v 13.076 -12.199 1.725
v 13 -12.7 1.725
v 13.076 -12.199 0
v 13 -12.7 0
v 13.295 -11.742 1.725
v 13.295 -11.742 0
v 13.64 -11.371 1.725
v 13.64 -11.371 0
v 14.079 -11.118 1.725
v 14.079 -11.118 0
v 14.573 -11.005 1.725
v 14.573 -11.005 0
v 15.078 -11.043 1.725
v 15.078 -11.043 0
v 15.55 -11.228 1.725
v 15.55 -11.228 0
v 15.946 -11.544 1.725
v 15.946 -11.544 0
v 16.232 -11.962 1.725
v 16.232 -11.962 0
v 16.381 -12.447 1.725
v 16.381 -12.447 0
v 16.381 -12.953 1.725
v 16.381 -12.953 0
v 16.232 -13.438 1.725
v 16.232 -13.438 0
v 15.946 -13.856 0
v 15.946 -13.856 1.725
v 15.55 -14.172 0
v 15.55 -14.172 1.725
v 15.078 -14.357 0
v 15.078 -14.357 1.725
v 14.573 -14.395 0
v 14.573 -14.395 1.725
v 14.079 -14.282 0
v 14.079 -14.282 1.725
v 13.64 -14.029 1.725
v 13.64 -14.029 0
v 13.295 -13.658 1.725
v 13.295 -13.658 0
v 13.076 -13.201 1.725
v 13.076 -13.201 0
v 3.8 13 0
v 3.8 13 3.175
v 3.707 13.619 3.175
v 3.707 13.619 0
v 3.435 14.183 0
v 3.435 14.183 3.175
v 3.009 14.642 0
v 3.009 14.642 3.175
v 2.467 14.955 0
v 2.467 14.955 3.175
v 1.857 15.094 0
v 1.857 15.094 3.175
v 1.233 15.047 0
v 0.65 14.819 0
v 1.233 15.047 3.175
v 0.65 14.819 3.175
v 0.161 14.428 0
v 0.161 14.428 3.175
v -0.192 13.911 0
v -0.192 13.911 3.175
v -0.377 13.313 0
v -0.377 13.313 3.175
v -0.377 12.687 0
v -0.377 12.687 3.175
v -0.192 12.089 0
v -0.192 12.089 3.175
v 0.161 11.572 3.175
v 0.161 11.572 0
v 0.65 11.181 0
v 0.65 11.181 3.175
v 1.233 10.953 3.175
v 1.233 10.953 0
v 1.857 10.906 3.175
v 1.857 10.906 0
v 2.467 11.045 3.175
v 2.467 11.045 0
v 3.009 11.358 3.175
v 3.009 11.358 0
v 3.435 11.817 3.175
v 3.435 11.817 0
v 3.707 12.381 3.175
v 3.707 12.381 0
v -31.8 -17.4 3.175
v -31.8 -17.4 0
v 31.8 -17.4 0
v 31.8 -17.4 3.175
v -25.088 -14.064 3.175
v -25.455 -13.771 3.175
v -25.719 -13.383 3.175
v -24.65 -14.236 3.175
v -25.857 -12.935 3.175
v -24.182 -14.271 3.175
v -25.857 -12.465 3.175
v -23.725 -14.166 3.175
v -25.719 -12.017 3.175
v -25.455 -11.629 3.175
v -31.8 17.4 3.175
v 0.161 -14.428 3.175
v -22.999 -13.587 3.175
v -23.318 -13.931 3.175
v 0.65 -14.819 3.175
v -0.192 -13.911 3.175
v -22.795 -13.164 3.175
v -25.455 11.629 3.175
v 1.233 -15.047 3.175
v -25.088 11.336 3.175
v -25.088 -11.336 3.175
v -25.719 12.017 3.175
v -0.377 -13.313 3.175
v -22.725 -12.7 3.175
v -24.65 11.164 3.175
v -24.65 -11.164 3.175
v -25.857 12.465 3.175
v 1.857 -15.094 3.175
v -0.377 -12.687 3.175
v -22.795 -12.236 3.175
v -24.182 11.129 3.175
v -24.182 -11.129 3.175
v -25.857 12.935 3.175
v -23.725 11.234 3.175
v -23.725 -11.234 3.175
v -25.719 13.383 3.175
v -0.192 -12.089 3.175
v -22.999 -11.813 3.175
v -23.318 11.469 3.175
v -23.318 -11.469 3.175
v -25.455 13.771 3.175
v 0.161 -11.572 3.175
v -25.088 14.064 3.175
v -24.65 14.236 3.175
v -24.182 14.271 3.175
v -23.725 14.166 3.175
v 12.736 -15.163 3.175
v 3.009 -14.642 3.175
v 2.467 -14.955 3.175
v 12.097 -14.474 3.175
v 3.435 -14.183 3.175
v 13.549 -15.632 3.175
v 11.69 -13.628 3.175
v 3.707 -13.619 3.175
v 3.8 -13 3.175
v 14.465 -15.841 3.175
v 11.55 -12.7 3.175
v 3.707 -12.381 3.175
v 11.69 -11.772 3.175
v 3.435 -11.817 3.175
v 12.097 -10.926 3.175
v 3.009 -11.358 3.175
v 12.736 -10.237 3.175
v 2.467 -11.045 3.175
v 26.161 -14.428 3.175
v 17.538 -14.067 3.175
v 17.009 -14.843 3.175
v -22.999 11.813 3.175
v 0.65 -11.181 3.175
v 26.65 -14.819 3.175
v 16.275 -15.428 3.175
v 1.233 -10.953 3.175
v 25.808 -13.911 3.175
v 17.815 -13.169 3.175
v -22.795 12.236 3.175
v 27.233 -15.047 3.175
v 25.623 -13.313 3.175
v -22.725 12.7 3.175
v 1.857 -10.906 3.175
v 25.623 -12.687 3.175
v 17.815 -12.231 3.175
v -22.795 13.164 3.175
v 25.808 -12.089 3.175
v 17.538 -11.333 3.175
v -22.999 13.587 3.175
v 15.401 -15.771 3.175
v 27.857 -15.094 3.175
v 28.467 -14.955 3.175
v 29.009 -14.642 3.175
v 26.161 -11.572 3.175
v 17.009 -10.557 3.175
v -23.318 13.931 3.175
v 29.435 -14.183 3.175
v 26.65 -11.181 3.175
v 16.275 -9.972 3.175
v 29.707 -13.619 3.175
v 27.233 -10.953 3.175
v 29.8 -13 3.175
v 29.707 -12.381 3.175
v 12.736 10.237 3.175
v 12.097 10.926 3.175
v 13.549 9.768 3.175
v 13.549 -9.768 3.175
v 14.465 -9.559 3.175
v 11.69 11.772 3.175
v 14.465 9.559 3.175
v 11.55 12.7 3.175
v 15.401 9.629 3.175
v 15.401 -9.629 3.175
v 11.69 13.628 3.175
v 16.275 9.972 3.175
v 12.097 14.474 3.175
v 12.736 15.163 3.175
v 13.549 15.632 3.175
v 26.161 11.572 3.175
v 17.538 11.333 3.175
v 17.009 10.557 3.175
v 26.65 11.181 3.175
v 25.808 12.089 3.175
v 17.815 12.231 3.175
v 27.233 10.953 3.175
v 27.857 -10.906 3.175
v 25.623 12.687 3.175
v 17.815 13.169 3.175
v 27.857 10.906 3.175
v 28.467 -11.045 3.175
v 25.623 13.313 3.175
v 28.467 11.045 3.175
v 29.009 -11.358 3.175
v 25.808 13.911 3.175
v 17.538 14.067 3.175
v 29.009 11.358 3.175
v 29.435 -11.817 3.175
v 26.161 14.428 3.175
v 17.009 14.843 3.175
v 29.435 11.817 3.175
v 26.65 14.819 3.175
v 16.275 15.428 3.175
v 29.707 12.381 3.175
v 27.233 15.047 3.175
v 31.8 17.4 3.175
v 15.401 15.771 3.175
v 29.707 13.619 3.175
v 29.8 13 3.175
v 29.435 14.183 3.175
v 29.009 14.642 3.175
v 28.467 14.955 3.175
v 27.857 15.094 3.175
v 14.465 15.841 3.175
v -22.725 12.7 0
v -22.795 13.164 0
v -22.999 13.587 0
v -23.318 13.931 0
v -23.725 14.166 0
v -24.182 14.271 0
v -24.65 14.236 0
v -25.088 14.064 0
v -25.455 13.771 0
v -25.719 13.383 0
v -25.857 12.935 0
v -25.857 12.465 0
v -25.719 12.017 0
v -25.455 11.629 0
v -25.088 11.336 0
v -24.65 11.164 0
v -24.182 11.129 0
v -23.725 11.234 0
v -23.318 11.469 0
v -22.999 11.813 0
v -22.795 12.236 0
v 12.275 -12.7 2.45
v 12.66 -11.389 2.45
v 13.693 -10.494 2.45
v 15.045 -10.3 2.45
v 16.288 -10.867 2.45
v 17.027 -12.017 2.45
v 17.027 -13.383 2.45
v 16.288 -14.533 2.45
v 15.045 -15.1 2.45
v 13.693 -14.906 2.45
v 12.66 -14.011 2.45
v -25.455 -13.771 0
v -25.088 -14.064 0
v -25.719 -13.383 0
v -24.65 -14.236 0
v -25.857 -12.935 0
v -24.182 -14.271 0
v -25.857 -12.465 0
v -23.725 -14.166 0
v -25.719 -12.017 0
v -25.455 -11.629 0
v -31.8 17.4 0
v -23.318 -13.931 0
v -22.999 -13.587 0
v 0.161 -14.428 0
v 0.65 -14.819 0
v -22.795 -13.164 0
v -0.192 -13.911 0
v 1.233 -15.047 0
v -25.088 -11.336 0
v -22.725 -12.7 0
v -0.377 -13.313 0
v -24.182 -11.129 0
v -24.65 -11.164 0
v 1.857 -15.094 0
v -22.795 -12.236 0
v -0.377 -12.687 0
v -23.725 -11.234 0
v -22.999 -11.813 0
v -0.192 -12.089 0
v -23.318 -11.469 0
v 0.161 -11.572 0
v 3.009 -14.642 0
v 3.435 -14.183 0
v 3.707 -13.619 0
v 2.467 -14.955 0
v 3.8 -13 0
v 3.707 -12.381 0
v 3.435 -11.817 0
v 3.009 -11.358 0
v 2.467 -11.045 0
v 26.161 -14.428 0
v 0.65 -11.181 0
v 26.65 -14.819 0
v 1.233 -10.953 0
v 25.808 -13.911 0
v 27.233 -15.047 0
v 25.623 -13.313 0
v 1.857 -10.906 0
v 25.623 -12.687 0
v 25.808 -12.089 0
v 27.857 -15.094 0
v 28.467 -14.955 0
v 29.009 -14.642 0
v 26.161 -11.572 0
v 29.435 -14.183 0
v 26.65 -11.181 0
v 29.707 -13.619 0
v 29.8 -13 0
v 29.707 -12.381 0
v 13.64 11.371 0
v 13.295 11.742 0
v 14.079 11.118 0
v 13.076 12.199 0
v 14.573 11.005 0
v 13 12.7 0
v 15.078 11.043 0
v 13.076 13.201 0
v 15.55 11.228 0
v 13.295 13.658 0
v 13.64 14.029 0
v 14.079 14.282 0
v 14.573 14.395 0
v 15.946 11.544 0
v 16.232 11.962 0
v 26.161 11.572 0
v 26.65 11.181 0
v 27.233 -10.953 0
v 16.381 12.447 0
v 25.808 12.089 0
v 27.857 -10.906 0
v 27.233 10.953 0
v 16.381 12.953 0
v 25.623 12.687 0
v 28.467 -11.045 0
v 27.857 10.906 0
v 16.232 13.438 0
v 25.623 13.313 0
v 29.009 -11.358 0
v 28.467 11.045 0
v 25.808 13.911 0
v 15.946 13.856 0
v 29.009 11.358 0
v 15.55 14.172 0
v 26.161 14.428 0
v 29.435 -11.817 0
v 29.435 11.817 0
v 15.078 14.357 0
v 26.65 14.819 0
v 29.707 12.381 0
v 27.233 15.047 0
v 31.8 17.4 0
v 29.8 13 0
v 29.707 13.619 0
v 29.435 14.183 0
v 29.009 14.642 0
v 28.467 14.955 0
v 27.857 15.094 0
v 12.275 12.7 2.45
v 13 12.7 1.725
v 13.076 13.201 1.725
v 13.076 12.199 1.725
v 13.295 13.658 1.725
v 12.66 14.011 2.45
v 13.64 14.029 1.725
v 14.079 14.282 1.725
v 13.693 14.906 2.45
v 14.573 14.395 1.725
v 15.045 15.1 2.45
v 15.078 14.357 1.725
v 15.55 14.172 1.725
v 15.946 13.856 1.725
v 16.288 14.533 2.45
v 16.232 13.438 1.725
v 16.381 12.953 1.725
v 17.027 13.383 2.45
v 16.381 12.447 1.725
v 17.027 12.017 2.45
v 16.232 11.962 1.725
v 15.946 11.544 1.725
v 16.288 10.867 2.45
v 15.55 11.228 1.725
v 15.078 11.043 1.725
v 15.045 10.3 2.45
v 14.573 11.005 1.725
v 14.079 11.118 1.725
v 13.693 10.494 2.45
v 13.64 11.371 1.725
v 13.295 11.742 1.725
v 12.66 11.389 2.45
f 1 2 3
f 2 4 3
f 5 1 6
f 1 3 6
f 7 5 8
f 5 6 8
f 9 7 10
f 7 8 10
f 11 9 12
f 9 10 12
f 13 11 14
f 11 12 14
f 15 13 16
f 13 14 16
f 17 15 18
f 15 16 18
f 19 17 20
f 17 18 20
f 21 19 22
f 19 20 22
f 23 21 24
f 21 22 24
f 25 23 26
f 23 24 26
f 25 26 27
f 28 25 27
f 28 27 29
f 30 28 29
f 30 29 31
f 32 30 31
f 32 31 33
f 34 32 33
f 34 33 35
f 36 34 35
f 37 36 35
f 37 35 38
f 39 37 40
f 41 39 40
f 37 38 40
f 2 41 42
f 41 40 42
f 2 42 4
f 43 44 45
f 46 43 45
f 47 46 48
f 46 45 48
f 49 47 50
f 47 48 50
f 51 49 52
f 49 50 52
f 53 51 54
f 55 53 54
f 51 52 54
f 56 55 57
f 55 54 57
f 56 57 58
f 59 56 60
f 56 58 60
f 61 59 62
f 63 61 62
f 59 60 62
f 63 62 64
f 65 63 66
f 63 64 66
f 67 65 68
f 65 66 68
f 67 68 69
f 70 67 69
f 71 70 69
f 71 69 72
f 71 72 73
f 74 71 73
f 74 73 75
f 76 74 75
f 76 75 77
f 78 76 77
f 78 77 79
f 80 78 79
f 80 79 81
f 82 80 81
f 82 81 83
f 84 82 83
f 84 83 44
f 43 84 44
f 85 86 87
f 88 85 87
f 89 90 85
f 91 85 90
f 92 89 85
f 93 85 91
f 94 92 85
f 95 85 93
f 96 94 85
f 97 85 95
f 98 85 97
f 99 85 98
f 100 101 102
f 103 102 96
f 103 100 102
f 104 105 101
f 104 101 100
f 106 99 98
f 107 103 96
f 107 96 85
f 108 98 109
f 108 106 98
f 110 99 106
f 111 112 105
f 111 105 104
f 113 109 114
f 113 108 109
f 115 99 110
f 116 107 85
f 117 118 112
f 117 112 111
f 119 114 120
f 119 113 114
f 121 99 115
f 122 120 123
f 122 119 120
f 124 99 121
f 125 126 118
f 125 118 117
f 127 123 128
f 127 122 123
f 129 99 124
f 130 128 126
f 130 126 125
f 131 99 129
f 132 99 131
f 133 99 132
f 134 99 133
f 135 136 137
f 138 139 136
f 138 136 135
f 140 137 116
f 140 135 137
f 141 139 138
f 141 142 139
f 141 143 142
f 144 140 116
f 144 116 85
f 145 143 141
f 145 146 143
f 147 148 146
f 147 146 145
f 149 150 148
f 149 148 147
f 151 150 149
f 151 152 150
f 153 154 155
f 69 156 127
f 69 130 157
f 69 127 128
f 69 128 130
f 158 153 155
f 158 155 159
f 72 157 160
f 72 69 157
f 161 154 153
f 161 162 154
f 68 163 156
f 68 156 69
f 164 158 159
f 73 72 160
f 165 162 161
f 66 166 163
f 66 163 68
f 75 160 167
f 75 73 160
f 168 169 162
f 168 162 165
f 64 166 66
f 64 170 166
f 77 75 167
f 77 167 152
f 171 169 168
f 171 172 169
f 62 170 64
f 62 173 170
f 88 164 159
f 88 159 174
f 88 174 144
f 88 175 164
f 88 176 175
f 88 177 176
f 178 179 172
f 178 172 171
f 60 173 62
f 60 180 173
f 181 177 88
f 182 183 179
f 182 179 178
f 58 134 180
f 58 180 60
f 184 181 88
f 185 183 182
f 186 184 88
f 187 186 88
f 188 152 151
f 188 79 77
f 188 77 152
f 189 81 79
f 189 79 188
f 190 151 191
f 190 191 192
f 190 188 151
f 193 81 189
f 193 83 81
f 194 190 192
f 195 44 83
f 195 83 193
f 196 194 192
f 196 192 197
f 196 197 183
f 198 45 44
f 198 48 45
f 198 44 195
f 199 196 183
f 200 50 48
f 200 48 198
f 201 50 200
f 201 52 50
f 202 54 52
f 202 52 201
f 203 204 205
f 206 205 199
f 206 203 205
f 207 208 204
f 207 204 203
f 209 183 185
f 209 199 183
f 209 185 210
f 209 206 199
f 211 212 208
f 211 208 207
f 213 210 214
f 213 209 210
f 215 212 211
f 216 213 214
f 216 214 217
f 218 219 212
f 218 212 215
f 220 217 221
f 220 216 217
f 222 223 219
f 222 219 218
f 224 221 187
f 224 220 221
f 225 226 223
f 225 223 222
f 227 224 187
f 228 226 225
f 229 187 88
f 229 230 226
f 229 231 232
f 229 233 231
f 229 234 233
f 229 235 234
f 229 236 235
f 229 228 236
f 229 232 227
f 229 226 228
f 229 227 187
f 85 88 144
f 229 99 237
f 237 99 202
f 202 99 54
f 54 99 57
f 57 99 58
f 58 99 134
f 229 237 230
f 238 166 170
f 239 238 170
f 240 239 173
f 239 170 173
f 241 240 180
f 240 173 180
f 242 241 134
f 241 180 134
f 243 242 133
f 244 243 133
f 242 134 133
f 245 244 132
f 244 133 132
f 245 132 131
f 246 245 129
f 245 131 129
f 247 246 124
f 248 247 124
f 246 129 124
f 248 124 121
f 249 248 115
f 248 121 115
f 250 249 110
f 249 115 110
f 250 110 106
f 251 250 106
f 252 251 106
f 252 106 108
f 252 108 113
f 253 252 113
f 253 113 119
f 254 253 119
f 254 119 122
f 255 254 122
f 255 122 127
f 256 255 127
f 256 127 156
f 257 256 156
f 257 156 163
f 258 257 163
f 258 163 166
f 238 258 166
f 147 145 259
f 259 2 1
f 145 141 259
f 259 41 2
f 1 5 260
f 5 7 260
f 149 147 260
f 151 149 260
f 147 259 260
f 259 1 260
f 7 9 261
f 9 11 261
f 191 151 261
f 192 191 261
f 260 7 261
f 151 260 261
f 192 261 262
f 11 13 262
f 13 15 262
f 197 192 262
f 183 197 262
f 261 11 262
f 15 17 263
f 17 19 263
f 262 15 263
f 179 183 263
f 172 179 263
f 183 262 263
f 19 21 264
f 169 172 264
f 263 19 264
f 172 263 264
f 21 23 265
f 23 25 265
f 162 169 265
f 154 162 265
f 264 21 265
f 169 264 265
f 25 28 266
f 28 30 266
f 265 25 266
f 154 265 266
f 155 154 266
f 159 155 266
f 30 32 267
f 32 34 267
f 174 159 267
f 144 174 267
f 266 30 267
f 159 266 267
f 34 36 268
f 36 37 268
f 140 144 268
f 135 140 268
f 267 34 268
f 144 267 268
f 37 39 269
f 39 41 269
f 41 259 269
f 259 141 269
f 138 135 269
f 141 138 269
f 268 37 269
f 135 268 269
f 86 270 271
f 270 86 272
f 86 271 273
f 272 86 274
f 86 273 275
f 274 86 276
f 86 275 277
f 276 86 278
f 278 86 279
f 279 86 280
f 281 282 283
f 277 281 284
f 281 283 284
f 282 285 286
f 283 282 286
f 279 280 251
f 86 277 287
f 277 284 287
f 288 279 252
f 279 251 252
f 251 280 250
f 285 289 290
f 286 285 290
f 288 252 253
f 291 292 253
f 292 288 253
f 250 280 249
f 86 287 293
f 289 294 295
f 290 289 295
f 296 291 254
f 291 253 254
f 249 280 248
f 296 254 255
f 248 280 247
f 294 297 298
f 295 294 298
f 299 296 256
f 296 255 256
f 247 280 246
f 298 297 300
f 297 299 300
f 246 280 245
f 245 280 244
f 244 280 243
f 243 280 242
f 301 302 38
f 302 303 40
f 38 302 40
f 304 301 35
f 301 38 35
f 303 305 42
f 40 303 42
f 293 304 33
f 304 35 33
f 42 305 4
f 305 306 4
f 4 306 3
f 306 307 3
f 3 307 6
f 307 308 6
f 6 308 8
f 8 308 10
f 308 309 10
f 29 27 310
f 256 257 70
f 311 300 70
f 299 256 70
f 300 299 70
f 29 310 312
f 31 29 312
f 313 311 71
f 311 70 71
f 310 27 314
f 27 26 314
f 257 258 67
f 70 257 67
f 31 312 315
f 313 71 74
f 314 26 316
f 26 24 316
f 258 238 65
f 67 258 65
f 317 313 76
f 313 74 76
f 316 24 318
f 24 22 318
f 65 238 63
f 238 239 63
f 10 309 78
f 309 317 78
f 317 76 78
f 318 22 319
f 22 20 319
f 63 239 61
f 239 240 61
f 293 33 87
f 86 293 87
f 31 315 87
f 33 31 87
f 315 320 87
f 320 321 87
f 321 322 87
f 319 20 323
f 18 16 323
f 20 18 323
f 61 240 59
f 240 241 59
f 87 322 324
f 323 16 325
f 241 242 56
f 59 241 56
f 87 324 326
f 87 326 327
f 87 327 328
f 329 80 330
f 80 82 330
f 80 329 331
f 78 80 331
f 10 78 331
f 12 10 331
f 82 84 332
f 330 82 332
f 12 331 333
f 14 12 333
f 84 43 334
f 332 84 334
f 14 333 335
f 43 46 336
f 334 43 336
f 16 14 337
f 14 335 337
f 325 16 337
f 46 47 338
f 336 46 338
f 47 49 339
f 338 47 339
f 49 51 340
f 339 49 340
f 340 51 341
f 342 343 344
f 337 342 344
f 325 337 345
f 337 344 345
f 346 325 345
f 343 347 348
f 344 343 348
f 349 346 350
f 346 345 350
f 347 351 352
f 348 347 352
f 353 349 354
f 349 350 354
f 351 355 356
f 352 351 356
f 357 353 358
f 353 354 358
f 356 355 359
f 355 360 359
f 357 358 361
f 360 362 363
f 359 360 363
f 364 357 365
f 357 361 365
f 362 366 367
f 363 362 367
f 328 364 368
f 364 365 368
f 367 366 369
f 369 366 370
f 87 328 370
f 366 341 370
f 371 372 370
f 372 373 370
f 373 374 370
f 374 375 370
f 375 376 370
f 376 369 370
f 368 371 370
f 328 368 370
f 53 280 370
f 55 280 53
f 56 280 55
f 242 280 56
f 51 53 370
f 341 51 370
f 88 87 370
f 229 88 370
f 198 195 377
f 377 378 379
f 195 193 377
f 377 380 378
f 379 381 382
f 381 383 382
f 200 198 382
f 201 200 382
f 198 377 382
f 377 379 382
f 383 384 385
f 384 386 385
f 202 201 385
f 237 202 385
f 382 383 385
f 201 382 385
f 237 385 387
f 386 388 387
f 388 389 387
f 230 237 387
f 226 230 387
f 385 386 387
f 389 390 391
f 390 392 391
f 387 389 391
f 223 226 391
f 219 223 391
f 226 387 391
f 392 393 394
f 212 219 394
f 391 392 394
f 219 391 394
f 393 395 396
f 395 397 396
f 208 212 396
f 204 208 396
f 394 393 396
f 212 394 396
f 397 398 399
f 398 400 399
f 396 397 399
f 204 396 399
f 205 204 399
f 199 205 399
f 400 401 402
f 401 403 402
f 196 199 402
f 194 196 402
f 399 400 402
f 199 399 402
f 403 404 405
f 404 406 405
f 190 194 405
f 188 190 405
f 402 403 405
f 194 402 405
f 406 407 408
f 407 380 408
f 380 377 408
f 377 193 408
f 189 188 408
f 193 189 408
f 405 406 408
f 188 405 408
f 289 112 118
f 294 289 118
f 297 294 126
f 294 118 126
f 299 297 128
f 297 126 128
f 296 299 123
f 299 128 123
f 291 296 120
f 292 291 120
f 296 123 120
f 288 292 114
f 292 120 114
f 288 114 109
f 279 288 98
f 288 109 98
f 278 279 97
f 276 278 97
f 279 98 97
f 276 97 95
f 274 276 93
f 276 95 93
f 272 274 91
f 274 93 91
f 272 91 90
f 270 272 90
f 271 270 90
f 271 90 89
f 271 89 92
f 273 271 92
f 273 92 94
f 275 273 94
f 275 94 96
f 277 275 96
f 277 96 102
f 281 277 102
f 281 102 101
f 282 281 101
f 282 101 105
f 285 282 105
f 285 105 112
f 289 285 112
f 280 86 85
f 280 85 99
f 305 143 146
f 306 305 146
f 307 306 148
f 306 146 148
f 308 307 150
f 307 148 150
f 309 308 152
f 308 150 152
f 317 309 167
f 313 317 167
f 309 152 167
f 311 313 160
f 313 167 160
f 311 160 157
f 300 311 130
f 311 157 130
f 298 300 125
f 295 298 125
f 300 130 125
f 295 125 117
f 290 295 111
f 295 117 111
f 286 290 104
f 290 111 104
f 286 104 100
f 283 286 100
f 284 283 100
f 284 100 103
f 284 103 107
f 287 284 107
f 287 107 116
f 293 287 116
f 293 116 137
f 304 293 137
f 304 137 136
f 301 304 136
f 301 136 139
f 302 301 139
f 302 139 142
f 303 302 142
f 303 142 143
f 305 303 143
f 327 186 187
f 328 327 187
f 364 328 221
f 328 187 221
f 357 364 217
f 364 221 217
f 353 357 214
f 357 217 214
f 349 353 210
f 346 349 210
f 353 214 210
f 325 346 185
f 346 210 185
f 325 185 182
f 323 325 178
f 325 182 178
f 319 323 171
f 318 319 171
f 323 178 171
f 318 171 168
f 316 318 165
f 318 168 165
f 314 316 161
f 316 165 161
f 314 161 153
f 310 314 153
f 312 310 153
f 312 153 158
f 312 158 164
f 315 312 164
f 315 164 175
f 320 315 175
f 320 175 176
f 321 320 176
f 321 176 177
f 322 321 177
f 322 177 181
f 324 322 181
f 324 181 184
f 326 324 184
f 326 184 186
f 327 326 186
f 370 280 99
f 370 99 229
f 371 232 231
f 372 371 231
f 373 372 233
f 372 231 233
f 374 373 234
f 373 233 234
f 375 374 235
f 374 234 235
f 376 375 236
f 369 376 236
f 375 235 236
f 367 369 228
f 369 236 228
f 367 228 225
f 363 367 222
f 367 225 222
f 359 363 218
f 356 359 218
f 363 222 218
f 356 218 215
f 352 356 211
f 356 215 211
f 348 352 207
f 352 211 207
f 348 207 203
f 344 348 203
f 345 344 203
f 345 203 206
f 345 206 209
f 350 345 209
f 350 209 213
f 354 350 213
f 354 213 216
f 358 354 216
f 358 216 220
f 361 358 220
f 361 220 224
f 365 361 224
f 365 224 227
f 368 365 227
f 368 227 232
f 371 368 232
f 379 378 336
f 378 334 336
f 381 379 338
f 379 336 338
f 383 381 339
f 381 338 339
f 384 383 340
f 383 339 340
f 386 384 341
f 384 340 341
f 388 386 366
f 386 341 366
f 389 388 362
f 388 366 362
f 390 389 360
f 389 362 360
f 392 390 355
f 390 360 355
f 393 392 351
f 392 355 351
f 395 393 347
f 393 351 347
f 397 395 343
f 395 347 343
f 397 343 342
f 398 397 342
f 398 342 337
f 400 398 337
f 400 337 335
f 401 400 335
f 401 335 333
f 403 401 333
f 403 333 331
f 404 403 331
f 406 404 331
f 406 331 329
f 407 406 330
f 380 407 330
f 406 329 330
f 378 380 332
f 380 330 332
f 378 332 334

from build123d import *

# Parameters (mm, degrees)
PROFILE_SKETCH_W                                = 63.6
PROFILE_SKETCH_H                                = 34.8
PROFILE_EXTRUDE_DEPTH                           = 3.175
MOUNTING_HOLE_SKETCH_R                          = 1.575
MOUNTING_HOLE_CUT_DEPTH                         = 4.175
CSK_FOR_M3_FLAT_HEAD_MACHINE_SCREW1_D           = 3.4
CSK_FOR_M3_FLAT_HEAD_MACHINE_SCREW1_CSINK_D     = 6.3
CSK_FOR_M3_FLAT_HEAD_MACHINE_SCREW1_CSINK_ANGLE = 90
CARRIAGE_GUIDE_HOLE_SKETCH_R                    = 2.1
CARRIAGE_GUIDE_HOLE_CUT_DEPTH                   = 4.175


with BuildPart() as part:
    # Profile Sketch → Profile Extrude (new body)
    with BuildSketch(Plane.XY):
        Rectangle(PROFILE_SKETCH_W, PROFILE_SKETCH_H)
    extrude(amount=PROFILE_EXTRUDE_DEPTH)

    # Mounting Hole Sketch → Mounting Hole Cut (cut, through all)
    with BuildSketch(Plane.XY.offset(3.175)):
        with Locations((-24.3, 12.7)):
            Circle(MOUNTING_HOLE_SKETCH_R)
        with Locations((-24.3, -12.7)):
            Circle(MOUNTING_HOLE_SKETCH_R)
    extrude(amount=-MOUNTING_HOLE_CUT_DEPTH, mode=Mode.SUBTRACT)

    # CSK for M3 Flat Head Machine Screw1 (through all)
    with Locations(Plane(origin=(14.7, 12.7, 3.175), x_dir=(1, 0, 0), z_dir=(0, 0, 1))):
        with Locations((0, 0), (0, -25.4)):
            CounterSinkHole(CSK_FOR_M3_FLAT_HEAD_MACHINE_SCREW1_D / 2, CSK_FOR_M3_FLAT_HEAD_MACHINE_SCREW1_CSINK_D / 2, counter_sink_angle=CSK_FOR_M3_FLAT_HEAD_MACHINE_SCREW1_CSINK_ANGLE)

    # Carriage Guide Hole Sketch → Carriage Guide Hole Cut (cut, through all)
    with BuildSketch(Plane.XY.offset(3.175)):
        with Locations((1.7, 13)):
            Circle(CARRIAGE_GUIDE_HOLE_SKETCH_R)
        with Locations((27.7, 13)):
            Circle(CARRIAGE_GUIDE_HOLE_SKETCH_R)
        with Locations((27.7, -13)):
            Circle(CARRIAGE_GUIDE_HOLE_SKETCH_R)
        with Locations((1.7, -13)):
            Circle(CARRIAGE_GUIDE_HOLE_SKETCH_R)
    extrude(amount=-CARRIAGE_GUIDE_HOLE_CUT_DEPTH, mode=Mode.SUBTRACT)


solid = part.part
